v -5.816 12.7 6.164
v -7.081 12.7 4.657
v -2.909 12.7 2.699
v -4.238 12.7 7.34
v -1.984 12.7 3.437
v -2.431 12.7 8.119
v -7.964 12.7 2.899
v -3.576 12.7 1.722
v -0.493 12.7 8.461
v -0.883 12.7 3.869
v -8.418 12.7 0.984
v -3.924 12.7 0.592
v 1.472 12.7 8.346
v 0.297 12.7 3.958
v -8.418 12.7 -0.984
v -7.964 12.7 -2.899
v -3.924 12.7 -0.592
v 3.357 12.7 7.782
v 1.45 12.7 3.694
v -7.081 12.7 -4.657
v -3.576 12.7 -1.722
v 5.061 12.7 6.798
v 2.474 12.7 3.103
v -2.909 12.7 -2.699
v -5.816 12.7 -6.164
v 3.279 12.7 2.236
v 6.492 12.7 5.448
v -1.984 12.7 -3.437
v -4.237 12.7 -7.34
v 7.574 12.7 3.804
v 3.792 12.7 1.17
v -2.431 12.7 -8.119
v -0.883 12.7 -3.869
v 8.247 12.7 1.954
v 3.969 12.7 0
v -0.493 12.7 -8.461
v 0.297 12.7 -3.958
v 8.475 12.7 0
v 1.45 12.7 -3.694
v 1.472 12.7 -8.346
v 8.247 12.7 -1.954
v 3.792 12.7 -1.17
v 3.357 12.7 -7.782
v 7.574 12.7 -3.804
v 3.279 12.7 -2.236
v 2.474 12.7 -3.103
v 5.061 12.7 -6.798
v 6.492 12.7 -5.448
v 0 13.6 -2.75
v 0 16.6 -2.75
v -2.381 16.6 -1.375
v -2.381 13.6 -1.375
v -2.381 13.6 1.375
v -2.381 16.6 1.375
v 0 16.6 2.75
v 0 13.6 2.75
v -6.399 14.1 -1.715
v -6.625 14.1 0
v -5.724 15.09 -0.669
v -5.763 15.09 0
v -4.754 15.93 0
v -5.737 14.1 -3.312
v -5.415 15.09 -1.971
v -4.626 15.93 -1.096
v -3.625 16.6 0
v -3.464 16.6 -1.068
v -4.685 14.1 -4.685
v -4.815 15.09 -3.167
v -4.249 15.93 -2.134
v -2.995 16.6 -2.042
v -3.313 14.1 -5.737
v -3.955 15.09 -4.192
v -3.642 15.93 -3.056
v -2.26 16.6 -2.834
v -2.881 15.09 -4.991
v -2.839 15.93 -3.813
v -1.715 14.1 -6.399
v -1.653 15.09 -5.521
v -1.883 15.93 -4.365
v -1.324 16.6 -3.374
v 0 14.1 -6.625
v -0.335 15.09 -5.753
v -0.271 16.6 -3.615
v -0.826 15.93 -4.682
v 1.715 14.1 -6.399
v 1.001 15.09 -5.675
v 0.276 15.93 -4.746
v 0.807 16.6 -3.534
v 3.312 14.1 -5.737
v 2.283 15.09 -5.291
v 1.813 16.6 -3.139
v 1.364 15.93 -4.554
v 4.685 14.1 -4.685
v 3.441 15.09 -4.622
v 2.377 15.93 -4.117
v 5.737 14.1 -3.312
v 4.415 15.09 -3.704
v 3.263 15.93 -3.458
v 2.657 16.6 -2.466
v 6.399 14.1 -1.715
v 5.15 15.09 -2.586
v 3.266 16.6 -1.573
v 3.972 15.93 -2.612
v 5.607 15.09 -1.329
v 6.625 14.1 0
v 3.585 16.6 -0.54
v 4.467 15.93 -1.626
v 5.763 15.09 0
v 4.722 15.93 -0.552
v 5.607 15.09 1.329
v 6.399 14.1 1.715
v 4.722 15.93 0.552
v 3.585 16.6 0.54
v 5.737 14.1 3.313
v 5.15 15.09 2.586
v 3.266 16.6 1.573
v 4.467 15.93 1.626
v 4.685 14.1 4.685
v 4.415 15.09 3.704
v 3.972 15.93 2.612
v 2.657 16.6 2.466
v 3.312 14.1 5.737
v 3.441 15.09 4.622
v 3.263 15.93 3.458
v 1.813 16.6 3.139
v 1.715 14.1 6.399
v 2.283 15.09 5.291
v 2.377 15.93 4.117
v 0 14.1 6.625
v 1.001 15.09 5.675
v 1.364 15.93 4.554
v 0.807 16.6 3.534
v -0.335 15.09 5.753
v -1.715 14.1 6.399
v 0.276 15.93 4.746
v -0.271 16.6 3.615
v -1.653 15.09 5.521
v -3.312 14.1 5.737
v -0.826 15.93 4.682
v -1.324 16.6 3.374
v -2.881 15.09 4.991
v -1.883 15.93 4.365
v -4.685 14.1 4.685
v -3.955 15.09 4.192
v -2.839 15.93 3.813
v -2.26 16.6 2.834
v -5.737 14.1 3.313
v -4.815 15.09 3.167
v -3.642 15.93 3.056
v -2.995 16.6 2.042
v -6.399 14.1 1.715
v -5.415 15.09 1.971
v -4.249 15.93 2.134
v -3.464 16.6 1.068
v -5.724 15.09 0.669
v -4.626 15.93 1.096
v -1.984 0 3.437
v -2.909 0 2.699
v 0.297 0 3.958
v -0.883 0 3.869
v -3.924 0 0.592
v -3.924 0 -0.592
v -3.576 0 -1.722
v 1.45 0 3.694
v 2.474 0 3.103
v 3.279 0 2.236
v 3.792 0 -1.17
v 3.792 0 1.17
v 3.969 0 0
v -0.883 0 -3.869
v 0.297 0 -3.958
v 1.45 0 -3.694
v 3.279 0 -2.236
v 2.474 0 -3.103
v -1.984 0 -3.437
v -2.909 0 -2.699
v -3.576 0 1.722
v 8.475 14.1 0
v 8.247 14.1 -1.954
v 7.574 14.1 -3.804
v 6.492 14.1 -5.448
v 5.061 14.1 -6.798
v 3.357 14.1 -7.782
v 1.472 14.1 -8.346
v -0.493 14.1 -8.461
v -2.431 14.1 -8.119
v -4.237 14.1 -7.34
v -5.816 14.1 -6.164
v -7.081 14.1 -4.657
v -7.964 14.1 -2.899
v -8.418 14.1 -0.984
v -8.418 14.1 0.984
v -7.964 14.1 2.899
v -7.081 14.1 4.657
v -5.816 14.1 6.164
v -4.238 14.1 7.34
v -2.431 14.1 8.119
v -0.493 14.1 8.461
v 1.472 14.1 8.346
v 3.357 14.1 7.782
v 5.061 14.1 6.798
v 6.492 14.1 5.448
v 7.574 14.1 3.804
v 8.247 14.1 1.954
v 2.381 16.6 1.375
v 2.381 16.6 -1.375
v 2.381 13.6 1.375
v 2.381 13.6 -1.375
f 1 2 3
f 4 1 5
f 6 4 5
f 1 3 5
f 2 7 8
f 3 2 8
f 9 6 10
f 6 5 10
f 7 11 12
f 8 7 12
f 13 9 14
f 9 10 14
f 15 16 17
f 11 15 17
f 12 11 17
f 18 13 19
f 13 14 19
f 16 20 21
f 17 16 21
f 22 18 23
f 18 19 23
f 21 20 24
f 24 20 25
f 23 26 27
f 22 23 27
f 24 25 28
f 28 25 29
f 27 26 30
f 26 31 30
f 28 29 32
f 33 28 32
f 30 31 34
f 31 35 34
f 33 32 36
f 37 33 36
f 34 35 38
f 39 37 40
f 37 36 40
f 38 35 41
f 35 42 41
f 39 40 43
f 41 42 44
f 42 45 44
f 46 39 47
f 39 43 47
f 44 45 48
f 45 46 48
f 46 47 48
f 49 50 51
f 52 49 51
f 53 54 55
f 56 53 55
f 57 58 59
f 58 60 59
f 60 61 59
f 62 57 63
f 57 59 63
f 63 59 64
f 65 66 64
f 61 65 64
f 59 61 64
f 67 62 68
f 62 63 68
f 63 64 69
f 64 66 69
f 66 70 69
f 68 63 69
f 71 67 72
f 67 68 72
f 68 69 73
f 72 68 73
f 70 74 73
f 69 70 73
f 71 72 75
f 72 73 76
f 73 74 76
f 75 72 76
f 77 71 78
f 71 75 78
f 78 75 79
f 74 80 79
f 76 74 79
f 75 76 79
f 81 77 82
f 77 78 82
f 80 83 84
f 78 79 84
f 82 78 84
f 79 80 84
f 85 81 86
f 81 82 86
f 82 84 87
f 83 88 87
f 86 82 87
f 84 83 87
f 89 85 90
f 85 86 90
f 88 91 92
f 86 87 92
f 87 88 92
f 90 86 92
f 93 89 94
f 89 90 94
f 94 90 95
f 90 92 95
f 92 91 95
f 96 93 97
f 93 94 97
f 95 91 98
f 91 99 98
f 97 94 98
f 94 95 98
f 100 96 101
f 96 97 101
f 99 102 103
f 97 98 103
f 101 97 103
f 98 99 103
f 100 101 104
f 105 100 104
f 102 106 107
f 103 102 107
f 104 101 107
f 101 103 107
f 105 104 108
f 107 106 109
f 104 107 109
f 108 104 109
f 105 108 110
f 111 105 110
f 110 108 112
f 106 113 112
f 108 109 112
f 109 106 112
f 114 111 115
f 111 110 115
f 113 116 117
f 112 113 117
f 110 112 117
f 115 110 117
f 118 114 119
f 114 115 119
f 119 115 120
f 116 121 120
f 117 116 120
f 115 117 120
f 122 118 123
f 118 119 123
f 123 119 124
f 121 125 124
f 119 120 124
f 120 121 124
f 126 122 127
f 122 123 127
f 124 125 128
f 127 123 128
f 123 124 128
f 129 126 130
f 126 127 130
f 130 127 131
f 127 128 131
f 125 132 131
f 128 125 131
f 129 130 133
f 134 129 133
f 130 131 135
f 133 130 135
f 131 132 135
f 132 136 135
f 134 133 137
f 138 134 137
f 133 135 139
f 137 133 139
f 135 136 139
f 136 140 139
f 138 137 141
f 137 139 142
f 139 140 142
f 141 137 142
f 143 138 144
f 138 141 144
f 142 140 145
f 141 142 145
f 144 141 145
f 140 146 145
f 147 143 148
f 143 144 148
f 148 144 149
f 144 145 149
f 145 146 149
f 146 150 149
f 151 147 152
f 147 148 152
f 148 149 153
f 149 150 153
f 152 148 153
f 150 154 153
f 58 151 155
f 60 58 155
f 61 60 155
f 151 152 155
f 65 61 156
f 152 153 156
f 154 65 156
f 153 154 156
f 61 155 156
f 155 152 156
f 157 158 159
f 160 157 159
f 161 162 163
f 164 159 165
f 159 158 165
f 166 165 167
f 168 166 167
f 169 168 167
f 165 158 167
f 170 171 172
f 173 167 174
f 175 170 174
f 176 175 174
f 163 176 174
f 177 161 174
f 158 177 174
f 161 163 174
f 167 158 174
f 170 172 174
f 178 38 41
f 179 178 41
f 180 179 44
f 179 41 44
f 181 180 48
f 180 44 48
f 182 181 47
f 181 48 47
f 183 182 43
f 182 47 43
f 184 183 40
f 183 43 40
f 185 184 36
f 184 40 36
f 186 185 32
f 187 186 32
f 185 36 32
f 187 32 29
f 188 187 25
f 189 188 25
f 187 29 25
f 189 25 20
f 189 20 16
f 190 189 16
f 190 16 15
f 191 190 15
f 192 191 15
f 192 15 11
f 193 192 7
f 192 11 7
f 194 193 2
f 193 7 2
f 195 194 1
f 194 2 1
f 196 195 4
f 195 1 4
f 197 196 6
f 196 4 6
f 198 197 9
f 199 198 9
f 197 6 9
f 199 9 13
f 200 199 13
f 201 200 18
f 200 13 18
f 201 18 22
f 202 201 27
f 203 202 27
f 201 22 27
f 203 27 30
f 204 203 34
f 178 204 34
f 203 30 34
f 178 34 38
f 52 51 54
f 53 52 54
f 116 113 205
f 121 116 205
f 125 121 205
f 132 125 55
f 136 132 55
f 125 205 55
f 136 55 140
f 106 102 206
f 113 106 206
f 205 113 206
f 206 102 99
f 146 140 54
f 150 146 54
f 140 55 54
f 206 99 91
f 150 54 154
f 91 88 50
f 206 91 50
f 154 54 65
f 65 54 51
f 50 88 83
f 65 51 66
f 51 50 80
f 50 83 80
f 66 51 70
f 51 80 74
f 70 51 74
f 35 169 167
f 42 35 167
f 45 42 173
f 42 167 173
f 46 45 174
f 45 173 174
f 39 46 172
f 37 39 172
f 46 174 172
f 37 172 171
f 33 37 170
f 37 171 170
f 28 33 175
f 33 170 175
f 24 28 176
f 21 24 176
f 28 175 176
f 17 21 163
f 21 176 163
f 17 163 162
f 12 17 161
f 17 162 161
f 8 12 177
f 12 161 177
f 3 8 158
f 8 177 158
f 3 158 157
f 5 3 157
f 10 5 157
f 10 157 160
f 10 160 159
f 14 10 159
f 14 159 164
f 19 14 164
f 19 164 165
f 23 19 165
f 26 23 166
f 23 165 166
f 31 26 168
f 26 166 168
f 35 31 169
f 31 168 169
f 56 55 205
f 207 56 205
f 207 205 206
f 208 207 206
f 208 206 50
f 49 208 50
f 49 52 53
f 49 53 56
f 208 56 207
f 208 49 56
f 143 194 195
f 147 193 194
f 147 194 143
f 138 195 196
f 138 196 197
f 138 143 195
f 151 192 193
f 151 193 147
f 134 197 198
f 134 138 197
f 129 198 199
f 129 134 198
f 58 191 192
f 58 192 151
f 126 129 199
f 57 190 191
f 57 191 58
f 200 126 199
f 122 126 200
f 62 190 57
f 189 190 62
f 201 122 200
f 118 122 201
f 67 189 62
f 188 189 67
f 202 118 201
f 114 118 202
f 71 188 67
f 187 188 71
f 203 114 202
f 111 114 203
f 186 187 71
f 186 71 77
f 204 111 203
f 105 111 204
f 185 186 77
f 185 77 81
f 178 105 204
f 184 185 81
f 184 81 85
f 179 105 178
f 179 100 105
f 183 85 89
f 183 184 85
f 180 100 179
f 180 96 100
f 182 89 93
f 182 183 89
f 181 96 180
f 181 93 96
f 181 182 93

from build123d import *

# Parameters (mm, degrees)
SKETCH1_R           = 3.96875
BOSS_EXTRUDE1_DEPTH = 12.7
SKETCH2_R           = 8.475
BOSS_EXTRUDE2_DEPTH = 1.4
CUT_EXTRUDE1_DEPTH  = 3


with BuildPart() as part:
    # Sketch1 → Boss-Extrude1 (new body)
    with BuildSketch(Plane(origin=(0, 0, 0), x_dir=(1, 0, 0), z_dir=(0, 1, 0))):
        Circle(SKETCH1_R)
    extrude(amount=BOSS_EXTRUDE1_DEPTH)

    # Sketch2 → Boss-Extrude2 (add)
    with BuildSketch(Plane(origin=(0, 12.7, 0), x_dir=(1, 0, 0), z_dir=(0, 1, 0))):
        Circle(SKETCH2_R)
    extrude(amount=BOSS_EXTRUDE2_DEPTH)

    # Sketch3 → Revolve2 (revolve)
    with BuildSketch(Plane.XY):
        with BuildLine():
            Line((-3.625, 16.6), (0, 16.6))
            Line((0, 16.6), (0, 14.1))
            Line((0, 14.1), (-6.625, 14.1))
            ThreePointArc((-6.625, 14.1), (-5.275236962, 15.530284354), (-3.625, 16.6))
        make_face()
    revolve(axis=Axis((0, 16.6, 0), (0, -1, 0)))

    # Sketch4 → Cut-Extrude1 (cut)
    with BuildSketch(Plane(origin=(0, 16.6, 0), x_dir=(1, 0, 0), z_dir=(0, 1, 0))):
        Polygon((-2.38125, 1.374815329), (-2.38125, -1.374815329), (0, -2.749630657), (2.38125, -1.374815329), (2.38125, 1.374815329), (0, 2.749630657), align=None)
    extrude(amount=-CUT_EXTRUDE1_DEPTH, mode=Mode.SUBTRACT)


solid = part.part
